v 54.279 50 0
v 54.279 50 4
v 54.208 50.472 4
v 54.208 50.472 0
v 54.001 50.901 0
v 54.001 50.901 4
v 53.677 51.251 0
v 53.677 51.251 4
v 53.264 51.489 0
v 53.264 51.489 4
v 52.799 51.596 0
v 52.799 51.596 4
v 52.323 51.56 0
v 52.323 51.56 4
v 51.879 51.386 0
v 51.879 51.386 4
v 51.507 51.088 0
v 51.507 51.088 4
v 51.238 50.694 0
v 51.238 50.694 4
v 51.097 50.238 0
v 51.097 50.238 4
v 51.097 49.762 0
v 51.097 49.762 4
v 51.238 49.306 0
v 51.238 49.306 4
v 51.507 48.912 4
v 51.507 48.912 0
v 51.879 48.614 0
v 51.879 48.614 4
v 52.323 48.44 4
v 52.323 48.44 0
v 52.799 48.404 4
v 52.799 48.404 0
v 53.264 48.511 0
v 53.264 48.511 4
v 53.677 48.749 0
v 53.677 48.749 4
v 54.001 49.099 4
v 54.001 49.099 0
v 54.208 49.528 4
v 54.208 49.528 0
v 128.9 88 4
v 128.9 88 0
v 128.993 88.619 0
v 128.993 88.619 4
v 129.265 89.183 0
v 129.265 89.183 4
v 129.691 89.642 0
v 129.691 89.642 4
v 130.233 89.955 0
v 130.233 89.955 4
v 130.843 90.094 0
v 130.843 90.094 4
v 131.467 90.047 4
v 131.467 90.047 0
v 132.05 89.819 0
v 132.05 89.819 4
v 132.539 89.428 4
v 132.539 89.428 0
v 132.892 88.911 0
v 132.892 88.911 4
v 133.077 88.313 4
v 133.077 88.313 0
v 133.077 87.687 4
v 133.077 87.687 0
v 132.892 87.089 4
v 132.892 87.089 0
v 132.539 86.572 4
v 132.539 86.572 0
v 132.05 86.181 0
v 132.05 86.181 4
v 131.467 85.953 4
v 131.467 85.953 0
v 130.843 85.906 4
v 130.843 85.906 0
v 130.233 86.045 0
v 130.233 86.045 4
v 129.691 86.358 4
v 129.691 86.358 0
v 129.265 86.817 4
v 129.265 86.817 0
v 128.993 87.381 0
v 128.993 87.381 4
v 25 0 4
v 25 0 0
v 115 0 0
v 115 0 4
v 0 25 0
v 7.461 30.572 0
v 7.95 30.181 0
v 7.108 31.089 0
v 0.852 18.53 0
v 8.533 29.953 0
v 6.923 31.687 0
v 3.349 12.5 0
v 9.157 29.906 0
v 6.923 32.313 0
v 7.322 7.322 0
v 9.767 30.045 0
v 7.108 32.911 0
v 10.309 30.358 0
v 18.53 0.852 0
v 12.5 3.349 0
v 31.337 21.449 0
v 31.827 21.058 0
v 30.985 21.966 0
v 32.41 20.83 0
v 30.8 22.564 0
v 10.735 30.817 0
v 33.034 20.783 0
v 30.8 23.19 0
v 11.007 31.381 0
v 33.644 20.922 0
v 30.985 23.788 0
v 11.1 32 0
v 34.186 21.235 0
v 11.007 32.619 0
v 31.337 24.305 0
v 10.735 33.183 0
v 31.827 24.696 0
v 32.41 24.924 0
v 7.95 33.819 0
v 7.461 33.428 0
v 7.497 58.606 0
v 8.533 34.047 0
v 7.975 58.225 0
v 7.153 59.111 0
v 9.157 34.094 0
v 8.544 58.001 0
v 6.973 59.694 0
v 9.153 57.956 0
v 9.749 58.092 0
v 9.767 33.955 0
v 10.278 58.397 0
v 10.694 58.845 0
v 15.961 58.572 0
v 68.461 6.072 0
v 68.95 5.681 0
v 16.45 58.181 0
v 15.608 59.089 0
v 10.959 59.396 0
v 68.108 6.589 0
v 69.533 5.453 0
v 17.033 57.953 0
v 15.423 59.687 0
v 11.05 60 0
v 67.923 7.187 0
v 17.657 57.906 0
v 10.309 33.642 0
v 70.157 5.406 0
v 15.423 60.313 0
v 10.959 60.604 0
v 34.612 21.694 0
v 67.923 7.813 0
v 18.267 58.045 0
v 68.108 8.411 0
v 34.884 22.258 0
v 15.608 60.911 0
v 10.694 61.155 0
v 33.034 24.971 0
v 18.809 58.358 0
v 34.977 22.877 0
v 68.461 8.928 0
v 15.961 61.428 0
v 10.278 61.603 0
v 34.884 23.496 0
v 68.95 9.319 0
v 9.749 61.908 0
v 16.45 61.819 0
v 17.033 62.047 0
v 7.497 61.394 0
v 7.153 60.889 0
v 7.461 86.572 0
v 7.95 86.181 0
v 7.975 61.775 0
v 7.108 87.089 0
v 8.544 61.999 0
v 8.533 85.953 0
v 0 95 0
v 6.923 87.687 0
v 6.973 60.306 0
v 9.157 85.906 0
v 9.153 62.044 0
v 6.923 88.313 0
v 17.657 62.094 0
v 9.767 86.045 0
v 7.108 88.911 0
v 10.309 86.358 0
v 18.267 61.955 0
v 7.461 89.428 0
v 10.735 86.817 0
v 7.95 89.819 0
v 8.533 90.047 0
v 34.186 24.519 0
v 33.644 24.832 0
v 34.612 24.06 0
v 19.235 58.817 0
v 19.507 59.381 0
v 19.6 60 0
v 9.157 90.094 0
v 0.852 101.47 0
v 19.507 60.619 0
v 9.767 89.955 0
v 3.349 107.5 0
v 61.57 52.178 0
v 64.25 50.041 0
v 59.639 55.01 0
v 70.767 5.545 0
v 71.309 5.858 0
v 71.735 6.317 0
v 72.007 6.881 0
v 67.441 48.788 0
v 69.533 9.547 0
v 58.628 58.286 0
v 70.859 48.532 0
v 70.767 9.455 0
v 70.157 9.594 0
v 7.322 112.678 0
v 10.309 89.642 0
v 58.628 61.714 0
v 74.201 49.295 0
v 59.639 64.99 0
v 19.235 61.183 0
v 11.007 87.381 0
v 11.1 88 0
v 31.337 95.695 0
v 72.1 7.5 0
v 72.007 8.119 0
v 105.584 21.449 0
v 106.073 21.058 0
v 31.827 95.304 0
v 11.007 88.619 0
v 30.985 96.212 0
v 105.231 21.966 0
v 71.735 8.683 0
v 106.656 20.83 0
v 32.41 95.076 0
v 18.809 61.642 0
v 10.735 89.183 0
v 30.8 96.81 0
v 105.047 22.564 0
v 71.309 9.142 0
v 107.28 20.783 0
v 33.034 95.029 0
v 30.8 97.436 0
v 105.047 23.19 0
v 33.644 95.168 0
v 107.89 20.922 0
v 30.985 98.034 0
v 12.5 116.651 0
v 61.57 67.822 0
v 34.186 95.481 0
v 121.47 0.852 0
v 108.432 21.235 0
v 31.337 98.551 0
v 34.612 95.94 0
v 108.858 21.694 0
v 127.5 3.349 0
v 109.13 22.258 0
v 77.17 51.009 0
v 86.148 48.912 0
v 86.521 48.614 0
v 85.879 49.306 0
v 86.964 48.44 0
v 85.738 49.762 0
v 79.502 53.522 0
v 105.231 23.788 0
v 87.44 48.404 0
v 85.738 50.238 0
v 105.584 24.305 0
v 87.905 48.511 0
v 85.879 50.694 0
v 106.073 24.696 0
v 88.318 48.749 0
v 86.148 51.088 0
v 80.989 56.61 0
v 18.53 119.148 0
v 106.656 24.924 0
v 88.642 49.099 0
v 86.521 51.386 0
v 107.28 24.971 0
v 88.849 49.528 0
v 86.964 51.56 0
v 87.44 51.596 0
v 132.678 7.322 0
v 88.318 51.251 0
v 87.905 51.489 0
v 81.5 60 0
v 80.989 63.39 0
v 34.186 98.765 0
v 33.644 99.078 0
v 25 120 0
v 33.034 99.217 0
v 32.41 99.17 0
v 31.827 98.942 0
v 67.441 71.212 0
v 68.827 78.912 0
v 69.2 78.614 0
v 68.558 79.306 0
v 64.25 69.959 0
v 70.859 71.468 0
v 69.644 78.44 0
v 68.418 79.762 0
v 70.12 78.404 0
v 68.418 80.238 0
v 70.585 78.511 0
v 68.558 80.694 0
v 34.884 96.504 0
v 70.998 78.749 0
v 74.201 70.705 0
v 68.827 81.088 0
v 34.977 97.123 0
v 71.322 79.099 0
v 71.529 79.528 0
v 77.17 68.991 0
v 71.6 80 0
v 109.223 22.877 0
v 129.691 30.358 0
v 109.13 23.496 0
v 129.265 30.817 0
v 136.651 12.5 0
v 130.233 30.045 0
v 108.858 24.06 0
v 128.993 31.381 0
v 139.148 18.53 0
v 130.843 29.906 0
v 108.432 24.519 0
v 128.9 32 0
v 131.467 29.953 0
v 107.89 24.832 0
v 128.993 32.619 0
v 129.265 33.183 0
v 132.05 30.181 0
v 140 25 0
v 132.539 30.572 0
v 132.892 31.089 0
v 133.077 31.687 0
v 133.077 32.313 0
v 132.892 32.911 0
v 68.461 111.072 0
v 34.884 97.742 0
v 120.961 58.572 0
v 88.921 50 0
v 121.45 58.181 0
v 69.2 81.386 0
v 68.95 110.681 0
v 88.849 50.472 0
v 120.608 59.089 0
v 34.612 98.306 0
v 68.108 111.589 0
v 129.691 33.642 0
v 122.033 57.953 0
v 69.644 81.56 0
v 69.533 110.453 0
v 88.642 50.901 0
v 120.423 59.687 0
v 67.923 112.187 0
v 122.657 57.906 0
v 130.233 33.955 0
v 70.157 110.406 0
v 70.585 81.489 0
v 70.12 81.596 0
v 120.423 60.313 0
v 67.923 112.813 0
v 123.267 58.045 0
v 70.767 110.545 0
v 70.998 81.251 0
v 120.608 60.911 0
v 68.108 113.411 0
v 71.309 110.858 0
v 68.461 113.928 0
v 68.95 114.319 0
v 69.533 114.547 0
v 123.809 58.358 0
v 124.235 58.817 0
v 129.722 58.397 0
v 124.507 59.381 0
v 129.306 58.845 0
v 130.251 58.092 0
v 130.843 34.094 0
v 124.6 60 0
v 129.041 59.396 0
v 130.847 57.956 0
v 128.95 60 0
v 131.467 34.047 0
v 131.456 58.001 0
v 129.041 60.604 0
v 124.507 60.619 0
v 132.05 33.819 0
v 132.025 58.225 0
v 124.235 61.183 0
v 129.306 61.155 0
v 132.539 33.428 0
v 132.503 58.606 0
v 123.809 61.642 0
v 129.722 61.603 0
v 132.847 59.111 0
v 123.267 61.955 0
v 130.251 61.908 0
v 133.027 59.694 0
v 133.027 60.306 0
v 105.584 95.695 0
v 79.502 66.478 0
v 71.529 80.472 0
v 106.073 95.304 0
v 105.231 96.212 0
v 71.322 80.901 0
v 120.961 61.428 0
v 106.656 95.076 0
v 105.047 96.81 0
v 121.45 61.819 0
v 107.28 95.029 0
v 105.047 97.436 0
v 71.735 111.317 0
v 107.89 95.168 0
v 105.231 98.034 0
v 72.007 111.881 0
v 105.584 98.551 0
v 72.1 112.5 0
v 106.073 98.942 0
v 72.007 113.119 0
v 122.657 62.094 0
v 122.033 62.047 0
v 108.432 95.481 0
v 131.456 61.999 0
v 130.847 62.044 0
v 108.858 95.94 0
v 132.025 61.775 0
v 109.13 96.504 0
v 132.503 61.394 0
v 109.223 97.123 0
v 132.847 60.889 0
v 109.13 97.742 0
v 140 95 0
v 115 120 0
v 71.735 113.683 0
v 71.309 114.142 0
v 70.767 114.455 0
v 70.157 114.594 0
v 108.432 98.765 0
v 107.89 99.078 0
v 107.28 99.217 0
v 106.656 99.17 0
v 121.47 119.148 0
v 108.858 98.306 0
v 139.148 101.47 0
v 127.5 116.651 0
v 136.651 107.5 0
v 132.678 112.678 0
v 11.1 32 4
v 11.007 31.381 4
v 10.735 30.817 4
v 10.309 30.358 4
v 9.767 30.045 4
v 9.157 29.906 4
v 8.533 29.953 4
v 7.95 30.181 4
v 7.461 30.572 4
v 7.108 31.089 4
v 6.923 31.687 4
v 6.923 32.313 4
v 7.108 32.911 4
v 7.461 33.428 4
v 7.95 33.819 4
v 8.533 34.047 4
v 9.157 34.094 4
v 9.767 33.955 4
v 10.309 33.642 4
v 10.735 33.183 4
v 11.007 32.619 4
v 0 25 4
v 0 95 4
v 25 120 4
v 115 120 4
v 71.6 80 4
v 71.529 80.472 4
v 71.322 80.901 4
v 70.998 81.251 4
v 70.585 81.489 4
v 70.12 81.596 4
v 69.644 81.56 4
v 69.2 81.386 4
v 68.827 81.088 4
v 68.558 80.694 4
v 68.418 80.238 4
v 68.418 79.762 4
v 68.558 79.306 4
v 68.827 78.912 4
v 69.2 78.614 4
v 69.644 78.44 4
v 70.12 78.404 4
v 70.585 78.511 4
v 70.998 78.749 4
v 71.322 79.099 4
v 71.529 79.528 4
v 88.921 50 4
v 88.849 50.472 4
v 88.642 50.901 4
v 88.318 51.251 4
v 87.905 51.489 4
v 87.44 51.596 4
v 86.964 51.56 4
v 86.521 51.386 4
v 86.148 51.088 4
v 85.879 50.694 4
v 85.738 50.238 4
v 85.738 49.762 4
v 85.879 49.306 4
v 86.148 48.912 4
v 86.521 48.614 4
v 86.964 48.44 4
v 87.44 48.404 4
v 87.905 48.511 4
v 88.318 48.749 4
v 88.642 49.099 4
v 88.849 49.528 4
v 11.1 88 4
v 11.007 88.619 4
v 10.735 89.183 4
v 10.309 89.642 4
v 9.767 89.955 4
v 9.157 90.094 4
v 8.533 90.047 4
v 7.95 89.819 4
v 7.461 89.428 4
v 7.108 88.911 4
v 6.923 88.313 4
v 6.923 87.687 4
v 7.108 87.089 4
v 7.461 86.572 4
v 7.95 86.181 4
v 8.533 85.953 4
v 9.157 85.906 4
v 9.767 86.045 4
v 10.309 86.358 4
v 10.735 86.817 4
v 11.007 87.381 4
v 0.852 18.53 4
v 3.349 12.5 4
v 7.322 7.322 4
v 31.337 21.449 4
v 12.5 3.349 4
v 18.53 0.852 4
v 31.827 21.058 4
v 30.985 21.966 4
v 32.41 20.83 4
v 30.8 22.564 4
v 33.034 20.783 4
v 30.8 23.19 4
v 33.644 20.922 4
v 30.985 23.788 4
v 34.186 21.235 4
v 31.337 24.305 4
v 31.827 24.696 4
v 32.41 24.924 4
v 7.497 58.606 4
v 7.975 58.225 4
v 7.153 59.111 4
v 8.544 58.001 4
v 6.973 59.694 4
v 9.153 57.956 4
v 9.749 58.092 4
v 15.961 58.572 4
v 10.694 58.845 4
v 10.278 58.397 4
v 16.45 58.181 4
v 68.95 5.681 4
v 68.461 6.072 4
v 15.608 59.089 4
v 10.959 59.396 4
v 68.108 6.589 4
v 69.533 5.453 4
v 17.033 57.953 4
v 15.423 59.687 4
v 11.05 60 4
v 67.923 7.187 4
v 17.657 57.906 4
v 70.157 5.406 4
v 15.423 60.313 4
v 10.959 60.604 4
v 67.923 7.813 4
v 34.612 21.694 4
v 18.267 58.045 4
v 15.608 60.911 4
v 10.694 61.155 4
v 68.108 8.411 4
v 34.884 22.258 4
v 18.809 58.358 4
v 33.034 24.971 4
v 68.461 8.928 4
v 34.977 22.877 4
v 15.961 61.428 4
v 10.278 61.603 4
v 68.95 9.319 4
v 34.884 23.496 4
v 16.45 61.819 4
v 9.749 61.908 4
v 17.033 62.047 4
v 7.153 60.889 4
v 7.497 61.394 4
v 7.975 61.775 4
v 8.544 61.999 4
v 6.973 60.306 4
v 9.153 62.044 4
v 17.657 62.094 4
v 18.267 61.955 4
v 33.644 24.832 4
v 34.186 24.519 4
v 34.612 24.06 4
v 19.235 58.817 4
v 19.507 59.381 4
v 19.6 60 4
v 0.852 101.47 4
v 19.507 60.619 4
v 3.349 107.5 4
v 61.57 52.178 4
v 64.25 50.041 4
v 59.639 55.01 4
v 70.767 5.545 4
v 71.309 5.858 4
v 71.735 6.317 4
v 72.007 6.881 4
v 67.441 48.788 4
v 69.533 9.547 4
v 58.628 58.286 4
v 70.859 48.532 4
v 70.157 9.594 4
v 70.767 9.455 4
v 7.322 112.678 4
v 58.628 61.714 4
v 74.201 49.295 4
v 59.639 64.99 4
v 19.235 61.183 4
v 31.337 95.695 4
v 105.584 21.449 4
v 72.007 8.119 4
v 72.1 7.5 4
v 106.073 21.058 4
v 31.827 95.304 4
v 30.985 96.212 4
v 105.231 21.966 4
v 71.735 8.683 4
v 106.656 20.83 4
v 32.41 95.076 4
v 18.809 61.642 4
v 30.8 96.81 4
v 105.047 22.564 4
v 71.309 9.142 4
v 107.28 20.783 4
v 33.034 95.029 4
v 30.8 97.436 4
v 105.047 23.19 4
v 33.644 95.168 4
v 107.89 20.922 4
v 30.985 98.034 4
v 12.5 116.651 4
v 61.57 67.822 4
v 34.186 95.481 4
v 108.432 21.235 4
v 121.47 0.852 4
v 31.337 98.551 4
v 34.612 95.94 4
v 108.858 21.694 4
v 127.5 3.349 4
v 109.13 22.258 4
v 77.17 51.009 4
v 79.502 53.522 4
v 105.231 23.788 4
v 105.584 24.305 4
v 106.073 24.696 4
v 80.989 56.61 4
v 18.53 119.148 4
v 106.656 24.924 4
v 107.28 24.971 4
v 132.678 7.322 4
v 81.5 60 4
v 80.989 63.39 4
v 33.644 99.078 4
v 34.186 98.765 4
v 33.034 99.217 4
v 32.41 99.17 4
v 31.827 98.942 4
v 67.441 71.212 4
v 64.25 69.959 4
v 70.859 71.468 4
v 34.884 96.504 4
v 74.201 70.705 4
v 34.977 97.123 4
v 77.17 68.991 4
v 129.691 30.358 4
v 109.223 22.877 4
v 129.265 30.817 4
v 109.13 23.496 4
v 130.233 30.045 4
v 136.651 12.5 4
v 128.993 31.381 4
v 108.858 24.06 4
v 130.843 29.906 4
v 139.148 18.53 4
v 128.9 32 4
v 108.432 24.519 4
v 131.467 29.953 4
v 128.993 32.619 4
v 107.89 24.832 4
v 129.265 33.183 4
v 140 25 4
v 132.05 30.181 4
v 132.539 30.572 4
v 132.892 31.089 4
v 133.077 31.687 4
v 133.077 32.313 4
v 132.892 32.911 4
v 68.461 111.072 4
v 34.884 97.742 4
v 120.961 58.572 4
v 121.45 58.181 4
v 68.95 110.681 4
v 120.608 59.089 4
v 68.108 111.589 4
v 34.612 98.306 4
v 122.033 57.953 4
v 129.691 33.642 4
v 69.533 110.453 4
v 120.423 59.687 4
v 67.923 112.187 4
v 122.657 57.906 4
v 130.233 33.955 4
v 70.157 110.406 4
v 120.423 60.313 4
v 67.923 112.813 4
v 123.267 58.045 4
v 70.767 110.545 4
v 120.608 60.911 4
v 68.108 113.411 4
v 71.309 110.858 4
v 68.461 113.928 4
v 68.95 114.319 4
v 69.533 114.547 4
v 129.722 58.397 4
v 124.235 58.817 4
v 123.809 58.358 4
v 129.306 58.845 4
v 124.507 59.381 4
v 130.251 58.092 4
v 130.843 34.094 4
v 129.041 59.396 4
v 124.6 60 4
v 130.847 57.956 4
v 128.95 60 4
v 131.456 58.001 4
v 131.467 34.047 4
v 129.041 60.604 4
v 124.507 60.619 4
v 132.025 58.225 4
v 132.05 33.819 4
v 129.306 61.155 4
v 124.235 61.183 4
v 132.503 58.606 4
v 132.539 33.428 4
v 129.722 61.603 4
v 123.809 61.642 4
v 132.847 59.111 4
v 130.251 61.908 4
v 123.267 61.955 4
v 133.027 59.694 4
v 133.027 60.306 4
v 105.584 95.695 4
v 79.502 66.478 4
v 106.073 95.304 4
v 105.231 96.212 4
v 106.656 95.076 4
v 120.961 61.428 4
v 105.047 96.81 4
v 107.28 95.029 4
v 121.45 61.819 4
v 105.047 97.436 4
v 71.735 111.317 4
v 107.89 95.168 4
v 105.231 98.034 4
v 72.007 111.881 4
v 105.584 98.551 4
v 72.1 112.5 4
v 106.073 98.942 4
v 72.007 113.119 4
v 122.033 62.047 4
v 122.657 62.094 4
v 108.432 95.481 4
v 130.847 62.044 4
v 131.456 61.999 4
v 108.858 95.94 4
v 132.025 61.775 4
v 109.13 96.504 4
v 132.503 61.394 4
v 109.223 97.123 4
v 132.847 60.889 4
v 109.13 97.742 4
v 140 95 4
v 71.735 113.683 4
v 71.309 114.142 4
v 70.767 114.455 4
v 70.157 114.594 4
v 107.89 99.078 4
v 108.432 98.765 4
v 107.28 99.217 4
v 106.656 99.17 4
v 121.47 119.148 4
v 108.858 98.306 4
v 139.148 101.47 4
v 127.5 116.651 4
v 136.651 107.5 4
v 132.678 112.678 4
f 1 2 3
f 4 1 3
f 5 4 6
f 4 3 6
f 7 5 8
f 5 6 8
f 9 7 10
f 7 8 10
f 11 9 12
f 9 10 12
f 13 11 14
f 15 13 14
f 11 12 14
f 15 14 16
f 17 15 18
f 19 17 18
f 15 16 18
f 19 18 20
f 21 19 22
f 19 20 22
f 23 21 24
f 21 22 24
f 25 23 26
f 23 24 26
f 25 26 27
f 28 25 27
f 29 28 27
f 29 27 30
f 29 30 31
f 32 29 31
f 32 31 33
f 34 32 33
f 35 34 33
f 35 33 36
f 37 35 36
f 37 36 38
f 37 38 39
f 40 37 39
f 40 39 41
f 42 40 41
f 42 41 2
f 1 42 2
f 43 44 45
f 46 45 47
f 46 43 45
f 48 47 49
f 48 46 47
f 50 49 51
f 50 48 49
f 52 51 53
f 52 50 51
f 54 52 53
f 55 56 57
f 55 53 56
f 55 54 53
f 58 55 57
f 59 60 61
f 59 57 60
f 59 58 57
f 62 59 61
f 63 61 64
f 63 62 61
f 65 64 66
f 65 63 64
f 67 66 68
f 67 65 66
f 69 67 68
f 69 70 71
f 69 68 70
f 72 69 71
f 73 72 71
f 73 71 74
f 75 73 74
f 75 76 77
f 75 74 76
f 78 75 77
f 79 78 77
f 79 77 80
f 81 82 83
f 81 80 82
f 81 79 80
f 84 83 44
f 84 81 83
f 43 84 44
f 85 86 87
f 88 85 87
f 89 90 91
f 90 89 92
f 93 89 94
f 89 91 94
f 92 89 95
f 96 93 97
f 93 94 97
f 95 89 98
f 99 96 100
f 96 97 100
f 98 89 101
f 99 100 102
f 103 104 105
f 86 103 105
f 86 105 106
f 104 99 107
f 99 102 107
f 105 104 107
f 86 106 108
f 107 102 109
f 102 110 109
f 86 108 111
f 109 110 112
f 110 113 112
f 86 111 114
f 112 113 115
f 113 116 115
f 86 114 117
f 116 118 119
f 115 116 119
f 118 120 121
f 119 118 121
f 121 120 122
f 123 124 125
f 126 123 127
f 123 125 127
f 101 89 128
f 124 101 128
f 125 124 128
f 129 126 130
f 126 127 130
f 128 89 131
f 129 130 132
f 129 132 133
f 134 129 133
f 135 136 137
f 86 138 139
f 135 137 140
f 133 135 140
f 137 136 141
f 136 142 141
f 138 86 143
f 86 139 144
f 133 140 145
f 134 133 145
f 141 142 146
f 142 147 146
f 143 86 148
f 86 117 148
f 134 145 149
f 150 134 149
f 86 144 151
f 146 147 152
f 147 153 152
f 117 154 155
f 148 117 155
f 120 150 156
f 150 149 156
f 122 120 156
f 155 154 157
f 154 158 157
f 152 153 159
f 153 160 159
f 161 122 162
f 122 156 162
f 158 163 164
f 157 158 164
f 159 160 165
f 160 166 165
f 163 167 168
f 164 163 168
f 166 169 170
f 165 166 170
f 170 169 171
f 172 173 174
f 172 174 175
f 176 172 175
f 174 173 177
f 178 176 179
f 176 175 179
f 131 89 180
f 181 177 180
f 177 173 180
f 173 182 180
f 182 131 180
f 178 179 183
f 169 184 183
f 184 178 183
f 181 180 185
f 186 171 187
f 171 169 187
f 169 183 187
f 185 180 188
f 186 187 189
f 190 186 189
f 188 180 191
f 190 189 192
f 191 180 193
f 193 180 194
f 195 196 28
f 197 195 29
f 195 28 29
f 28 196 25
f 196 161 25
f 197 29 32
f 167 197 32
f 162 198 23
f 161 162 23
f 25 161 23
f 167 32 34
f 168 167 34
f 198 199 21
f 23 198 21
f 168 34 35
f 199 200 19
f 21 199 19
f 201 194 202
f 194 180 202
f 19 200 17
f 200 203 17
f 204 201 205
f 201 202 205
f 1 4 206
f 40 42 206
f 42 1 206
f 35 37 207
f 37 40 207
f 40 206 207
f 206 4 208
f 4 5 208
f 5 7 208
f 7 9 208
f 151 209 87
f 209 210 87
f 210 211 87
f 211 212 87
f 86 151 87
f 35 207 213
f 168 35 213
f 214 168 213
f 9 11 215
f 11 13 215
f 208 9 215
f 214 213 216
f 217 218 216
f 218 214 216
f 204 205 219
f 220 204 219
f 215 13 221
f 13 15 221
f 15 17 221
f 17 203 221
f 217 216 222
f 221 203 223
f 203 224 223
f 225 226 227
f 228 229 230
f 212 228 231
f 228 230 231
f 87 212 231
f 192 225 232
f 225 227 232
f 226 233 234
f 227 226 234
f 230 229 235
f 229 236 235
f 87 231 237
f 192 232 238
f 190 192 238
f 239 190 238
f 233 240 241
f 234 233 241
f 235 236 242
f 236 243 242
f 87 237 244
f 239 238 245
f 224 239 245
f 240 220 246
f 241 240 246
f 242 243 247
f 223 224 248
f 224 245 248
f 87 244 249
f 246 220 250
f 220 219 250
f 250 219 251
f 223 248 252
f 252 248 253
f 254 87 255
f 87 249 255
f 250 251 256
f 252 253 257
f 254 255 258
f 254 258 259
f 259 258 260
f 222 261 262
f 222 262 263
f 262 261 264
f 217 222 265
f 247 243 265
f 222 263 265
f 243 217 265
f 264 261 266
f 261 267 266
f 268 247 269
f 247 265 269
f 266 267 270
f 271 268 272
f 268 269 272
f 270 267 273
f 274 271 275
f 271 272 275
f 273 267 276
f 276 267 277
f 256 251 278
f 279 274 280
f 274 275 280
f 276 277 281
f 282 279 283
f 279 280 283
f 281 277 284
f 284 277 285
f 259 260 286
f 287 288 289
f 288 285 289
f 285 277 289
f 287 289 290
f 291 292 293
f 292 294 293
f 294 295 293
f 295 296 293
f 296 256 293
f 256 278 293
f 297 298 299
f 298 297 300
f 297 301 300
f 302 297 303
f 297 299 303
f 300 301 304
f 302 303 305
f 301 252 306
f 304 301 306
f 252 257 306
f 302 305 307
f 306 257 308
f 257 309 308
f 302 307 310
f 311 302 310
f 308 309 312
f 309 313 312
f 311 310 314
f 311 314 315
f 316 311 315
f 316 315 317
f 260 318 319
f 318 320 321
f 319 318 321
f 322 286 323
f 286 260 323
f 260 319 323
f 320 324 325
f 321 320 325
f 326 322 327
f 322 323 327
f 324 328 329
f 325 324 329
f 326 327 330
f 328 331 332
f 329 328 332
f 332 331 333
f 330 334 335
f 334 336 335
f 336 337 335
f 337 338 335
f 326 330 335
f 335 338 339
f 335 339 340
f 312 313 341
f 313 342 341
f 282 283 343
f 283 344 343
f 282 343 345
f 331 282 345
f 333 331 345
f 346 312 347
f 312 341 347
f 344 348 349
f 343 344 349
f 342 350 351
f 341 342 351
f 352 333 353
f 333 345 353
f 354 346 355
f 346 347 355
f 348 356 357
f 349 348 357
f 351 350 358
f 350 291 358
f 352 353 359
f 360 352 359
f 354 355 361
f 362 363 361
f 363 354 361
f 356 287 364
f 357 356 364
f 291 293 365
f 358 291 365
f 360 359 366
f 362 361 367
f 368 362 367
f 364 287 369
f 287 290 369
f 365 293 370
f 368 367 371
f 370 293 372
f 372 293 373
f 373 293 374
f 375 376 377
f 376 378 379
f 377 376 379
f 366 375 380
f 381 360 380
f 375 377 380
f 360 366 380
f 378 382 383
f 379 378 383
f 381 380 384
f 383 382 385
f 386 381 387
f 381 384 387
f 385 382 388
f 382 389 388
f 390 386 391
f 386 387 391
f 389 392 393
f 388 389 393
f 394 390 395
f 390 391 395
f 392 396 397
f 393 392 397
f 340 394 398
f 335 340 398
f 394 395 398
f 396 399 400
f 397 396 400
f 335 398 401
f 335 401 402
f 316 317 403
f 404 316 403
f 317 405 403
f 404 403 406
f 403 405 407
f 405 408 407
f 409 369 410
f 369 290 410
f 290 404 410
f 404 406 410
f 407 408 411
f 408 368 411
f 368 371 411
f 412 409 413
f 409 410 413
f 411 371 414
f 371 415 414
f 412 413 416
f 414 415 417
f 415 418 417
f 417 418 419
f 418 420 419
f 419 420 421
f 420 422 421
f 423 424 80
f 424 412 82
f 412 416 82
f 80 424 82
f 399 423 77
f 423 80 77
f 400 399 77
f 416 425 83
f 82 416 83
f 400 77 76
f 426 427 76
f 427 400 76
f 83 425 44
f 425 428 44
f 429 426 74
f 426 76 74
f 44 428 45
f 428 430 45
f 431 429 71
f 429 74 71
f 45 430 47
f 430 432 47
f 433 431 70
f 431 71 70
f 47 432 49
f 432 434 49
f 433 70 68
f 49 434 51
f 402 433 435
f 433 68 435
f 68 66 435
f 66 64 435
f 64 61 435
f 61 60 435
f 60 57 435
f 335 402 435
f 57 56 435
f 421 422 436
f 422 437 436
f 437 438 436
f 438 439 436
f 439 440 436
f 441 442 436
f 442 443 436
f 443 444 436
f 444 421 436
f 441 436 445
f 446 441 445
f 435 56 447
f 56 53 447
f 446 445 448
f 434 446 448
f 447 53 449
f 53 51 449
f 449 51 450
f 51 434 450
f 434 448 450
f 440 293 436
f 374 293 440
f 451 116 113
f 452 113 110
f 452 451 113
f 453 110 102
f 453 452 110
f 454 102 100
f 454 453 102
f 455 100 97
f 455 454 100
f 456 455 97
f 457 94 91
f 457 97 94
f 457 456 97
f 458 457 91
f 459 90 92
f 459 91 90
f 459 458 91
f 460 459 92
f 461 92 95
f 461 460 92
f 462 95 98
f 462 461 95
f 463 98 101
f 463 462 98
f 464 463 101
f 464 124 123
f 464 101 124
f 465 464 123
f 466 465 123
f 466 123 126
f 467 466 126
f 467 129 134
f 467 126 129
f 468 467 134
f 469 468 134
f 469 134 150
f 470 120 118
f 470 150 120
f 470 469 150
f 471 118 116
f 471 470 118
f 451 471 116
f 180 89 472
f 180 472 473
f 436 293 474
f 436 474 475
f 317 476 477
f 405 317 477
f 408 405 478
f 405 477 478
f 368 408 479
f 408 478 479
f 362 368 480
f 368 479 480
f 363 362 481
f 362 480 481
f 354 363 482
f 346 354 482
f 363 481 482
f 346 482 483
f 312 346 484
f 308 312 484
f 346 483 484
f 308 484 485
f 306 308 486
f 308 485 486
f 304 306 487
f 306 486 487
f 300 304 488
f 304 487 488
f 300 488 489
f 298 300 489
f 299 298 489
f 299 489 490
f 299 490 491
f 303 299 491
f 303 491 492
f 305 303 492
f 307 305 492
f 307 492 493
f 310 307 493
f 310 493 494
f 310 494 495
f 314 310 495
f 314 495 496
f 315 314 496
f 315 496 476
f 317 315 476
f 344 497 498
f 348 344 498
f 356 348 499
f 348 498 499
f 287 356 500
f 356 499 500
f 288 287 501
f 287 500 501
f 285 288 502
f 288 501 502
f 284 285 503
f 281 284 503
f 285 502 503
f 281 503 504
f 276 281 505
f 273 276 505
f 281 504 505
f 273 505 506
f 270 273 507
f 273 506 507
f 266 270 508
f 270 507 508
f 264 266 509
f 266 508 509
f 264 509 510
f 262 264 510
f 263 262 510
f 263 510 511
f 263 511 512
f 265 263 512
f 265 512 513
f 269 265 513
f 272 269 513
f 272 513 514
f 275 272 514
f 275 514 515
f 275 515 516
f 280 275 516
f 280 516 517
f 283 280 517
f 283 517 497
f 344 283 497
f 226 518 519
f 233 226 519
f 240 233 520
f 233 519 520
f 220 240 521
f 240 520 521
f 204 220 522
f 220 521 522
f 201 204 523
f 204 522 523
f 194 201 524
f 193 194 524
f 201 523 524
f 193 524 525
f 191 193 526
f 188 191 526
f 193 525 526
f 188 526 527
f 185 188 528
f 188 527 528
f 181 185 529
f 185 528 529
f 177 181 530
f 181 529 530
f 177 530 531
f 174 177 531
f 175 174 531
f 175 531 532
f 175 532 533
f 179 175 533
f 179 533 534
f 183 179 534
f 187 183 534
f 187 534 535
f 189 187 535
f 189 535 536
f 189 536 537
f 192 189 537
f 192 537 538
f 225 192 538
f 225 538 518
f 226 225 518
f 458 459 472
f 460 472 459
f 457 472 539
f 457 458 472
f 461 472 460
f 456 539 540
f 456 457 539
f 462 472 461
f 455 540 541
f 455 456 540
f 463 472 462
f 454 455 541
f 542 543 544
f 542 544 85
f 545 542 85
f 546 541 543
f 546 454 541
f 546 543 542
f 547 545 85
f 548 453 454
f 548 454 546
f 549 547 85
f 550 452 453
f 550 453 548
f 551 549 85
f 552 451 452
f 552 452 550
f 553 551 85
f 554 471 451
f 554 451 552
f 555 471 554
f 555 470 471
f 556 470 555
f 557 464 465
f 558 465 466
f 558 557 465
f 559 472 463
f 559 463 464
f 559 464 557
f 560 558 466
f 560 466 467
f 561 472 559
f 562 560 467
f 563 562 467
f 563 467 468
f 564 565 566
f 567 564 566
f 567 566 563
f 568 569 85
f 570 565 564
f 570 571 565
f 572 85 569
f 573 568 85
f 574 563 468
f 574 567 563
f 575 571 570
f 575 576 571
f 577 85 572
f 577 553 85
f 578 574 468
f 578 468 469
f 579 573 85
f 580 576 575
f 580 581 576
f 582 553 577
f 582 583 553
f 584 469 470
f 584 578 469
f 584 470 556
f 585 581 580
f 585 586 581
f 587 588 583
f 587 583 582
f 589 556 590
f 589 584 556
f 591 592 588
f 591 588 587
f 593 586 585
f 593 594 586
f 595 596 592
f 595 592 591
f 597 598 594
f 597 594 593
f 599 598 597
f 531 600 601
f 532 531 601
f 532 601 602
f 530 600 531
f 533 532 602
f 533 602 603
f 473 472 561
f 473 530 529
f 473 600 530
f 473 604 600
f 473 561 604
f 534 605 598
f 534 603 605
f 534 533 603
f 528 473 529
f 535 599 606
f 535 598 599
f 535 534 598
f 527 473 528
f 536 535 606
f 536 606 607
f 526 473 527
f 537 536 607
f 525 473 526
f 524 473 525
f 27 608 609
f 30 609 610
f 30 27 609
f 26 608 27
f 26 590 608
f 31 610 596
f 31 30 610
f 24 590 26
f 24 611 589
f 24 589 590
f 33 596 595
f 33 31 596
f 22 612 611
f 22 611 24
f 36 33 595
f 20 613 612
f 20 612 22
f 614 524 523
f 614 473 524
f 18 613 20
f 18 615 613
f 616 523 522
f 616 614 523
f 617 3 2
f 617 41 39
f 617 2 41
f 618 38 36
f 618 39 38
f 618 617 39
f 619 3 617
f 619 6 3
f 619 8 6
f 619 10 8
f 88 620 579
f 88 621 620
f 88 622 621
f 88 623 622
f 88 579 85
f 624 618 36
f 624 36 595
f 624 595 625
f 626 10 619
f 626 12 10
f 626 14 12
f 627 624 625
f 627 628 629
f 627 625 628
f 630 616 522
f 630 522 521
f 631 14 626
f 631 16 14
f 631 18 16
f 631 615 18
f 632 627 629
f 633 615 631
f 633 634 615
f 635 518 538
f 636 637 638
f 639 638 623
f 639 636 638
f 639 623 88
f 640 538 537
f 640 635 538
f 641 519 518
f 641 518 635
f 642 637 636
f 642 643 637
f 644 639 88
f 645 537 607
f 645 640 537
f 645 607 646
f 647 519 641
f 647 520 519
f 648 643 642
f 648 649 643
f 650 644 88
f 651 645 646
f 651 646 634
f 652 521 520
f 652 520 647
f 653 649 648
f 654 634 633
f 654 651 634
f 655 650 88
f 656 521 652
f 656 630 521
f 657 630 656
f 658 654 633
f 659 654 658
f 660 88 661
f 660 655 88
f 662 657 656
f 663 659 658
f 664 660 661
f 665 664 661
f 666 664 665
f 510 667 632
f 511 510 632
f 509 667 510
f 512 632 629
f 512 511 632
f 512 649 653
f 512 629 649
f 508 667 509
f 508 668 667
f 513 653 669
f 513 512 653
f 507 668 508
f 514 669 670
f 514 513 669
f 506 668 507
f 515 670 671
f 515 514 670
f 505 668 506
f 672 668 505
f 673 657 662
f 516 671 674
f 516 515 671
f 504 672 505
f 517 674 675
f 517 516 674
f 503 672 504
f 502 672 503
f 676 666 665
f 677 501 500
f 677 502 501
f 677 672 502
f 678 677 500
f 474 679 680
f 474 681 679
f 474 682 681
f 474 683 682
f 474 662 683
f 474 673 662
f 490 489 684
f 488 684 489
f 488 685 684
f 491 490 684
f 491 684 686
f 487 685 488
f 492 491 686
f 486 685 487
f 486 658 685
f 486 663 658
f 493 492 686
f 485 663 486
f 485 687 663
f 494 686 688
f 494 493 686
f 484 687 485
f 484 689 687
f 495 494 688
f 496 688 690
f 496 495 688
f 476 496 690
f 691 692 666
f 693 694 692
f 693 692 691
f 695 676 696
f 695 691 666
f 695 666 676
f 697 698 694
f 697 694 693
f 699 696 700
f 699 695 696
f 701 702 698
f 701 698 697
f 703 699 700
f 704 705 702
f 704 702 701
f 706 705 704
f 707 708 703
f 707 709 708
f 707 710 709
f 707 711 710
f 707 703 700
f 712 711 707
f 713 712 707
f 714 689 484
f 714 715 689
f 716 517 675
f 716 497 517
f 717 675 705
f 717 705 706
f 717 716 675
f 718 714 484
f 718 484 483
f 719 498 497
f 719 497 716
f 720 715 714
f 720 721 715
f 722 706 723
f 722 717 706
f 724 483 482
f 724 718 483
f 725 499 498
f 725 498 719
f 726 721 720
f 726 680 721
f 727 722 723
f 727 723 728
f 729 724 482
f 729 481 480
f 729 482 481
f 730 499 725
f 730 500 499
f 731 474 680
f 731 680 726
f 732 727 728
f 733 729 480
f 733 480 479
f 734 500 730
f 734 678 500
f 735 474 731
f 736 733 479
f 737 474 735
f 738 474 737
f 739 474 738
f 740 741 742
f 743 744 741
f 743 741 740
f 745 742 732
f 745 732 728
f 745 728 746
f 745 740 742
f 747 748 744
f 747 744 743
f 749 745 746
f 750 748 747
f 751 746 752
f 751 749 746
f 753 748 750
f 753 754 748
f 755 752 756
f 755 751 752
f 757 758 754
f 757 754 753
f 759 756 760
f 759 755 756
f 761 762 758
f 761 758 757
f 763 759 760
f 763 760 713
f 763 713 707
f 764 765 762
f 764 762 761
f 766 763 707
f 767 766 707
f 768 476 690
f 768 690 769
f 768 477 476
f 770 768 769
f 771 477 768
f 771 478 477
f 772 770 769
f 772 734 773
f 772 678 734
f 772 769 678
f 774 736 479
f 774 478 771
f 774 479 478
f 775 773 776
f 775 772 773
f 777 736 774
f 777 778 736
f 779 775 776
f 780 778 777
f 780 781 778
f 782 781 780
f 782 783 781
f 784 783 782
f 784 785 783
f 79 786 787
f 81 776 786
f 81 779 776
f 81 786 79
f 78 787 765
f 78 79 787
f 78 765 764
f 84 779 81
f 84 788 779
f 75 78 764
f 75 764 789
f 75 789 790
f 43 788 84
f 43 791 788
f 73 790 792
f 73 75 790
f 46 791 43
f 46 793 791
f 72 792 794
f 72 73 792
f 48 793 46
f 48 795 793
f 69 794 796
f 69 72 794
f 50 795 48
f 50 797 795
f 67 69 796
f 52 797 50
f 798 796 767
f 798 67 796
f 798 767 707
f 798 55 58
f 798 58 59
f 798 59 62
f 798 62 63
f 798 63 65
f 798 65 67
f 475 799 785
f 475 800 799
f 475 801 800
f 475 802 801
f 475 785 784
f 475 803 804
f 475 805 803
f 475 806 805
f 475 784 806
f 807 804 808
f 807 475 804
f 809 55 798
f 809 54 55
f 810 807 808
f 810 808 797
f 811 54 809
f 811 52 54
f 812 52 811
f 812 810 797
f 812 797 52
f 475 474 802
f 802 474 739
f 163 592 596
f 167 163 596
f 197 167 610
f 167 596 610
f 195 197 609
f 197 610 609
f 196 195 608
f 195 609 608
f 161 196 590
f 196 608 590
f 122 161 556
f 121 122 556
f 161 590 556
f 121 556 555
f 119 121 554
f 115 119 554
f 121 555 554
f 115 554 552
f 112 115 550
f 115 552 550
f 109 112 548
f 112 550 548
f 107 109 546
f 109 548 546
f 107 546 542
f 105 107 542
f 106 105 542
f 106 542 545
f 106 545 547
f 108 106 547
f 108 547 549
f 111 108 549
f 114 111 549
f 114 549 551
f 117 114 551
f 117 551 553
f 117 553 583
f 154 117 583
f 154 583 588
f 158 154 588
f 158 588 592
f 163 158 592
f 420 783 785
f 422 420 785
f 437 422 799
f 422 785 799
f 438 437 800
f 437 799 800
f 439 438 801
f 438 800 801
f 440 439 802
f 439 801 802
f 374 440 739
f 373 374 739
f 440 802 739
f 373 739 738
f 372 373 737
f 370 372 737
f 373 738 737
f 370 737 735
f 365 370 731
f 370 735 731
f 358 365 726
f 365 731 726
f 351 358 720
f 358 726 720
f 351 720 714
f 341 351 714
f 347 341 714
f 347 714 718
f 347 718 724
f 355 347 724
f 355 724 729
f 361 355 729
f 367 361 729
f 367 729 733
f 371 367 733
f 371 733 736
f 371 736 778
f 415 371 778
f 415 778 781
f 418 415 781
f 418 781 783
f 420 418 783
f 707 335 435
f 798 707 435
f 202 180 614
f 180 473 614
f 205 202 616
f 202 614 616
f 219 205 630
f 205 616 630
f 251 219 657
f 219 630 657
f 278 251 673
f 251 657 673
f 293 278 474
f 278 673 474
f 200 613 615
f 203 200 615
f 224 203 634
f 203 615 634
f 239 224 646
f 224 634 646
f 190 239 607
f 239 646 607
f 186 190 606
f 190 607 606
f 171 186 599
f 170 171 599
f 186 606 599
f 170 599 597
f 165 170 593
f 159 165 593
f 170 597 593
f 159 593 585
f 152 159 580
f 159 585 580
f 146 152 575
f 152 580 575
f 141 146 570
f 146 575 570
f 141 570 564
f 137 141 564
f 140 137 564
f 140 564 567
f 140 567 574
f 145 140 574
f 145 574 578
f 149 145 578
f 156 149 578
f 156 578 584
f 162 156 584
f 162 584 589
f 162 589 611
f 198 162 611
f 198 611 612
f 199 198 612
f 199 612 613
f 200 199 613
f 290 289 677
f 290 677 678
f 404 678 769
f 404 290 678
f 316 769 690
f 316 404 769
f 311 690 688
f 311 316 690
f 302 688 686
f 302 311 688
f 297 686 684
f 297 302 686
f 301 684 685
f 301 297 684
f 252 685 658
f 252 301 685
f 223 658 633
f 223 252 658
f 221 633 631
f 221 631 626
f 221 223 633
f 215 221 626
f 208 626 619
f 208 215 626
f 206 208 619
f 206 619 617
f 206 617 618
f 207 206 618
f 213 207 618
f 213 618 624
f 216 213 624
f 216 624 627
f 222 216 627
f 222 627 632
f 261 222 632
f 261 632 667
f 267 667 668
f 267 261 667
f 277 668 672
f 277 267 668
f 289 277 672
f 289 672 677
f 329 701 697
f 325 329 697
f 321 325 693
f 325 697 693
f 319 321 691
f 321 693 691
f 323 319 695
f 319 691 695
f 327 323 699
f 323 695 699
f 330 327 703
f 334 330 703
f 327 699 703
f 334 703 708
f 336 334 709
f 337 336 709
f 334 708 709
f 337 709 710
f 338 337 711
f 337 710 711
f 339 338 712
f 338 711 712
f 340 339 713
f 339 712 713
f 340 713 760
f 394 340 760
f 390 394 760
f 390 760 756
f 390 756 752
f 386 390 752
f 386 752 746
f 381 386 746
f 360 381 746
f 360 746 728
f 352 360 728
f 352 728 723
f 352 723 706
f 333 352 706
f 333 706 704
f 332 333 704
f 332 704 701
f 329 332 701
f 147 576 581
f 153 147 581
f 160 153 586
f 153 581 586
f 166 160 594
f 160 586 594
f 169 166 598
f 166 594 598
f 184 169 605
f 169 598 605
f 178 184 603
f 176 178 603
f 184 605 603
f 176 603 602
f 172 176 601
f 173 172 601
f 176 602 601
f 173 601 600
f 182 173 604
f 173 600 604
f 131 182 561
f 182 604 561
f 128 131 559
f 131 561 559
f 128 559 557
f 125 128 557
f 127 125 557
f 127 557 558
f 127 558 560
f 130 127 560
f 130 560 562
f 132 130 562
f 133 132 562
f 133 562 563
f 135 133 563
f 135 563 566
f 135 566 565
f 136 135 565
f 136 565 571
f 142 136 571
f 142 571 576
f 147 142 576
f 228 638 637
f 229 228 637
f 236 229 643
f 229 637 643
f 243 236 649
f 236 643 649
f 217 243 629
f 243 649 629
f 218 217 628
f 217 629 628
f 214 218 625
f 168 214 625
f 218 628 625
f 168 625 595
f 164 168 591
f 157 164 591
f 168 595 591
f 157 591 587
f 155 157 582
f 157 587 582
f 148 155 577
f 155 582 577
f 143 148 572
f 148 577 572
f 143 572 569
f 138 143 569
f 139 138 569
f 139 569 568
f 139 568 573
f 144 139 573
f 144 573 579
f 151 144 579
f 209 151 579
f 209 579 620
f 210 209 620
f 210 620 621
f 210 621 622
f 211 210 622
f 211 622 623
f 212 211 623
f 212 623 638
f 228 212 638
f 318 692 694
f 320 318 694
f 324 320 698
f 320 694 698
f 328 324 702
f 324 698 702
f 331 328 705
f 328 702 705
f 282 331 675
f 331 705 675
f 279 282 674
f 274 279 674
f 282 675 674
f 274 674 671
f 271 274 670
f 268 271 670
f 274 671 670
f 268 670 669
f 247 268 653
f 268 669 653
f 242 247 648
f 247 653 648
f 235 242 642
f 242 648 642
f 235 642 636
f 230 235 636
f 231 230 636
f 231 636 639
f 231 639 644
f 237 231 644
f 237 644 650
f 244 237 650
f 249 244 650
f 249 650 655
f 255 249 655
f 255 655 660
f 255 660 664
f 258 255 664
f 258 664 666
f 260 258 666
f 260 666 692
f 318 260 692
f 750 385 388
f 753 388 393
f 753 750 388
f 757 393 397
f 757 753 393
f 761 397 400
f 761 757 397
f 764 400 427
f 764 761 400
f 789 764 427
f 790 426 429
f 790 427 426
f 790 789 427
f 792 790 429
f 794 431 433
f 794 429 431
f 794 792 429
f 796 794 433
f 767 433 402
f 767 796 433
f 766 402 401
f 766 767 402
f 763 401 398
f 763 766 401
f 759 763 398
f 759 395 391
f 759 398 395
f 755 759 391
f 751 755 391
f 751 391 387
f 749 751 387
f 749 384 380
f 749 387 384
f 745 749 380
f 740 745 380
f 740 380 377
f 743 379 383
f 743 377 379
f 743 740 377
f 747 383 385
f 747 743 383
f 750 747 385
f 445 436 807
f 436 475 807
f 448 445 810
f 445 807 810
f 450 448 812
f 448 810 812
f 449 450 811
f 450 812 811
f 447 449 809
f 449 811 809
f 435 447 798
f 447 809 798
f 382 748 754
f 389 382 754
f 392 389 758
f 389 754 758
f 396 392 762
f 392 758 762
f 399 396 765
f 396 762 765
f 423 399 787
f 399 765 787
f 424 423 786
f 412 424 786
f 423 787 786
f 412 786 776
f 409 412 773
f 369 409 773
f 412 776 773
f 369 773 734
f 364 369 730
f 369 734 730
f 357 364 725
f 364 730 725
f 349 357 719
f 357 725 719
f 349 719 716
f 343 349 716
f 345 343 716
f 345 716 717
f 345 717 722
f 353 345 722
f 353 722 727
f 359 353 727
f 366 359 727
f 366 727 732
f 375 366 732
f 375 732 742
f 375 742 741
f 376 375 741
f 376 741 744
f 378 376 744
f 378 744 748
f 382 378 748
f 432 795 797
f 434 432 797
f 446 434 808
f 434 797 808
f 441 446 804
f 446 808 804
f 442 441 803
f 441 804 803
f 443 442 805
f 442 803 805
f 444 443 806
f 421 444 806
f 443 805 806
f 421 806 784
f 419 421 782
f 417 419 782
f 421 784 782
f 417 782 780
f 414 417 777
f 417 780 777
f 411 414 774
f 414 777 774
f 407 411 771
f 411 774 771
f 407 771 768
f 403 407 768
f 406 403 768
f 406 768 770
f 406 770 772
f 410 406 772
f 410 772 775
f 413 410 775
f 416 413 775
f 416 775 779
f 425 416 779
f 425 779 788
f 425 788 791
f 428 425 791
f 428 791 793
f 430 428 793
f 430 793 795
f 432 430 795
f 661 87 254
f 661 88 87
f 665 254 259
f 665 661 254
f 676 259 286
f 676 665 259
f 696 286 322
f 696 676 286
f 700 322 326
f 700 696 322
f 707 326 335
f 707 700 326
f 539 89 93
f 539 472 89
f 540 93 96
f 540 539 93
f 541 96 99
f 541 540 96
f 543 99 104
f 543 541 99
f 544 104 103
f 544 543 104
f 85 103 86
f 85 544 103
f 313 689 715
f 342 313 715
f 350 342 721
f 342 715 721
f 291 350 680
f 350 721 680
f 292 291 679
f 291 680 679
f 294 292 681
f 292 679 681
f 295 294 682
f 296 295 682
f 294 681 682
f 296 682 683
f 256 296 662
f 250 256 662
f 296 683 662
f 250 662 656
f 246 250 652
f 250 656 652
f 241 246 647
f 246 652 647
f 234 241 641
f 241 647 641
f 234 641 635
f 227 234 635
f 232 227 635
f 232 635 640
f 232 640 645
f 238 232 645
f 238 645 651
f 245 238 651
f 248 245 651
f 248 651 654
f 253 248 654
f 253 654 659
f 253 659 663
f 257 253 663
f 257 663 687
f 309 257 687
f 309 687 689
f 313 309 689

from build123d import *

# Parameters (mm, degrees)
SKETCH_1_W                 = 140
SKETCH_1_H                 = 120
SKETCH_1_R                 = 11.5
EXTRUDE_1_DEPTH            = 4
SKETCH_31_R                = 2.05
SKETCH_31_R_2              = 2.1
CUT_EXTRUDE_16_DEPTH       = 10
MIRROR_2_COPY_1_SKETCH_R   = 2.05
MIRROR_2_COPY_1_SKETCH_R_2 = 2.1
MIRROR_2_COPY_1_DEPTH      = 10
FILLET_8_R                 = 25
SKETCH_32_R                = 2.1
CUT_EXTRUDE_17_DEPTH       = 10
SKETCH_33_R                = 1.6
CUT_EXTRUDE_18_DEPTH       = 10


with BuildPart() as part:
    # 草图1 → 凸台-拉伸1 (new body)
    with BuildSketch(Plane.XY):
        with Locations((70, 60)):
            Rectangle(SKETCH_1_W, SKETCH_1_H)
        with Locations((70, 60)):
            Circle(SKETCH_1_R, mode=Mode.SUBTRACT)
    extrude(amount=EXTRUDE_1_DEPTH)

    # 草图31 → 切除-拉伸16 (cut)
    with BuildSketch(Plane.XY.offset(4)):
        with Locations((9, 60)):
            Circle(SKETCH_31_R)
        with Locations((9, 88)):
            Circle(SKETCH_31_R_2)
    cut_extrude_16 = extrude(amount=-CUT_EXTRUDE_16_DEPTH, mode=Mode.SUBTRACT)

    # 镜向1: 切除-拉伸16 across plane
    add(cut_extrude_16.mirror(Plane.ZX.offset(60)), mode=Mode.SUBTRACT)

    # 镜向2: 切除-拉伸16 across plane
    add(cut_extrude_16.mirror(Plane.ZY.offset(-70)), mode=Mode.SUBTRACT)

    # 镜向2 copy 1 sketch → 镜向2 copy 1 (cut)
    with BuildSketch(Plane(origin=(140, 120, 4), x_dir=(-1, 0, 0), z_dir=(0, 0, 1))):
        with Locations((9, 60)):
            Circle(MIRROR_2_COPY_1_SKETCH_R)
        with Locations((9, 88)):
            Circle(MIRROR_2_COPY_1_SKETCH_R_2)
    extrude(amount=-MIRROR_2_COPY_1_DEPTH, mode=Mode.SUBTRACT)

    # 圆角8
    fillet_8_edges = [part.edges().sort_by_distance(p)[0] for p in [
        (0, 120, 2),
        (140, 120, 2),
        (140, 0, 2),
        (0, 0, 2),
    ]]
    fillet(fillet_8_edges, radius=FILLET_8_R)

    # 草图32 → 切除-拉伸17 (cut)
    with BuildSketch(Plane.XY.offset(4)):
        with Locations((70, 112.5)):
            Circle(SKETCH_32_R)
        with Locations((107.123106012, 97.123106012)):
            Circle(SKETCH_32_R)
        with Locations((122.5, 60)):
            Circle(SKETCH_32_R)
        with Locations((107.123106012, 22.876893988)):
            Circle(SKETCH_32_R)
        with Locations((70, 7.5)):
            Circle(SKETCH_32_R)
        with Locations((32.876893988, 22.876893988)):
            Circle(SKETCH_32_R)
        with Locations((17.5, 60)):
            Circle(SKETCH_32_R)
        with Locations((32.876893988, 97.123106012)):
            Circle(SKETCH_32_R)
    extrude(amount=-CUT_EXTRUDE_17_DEPTH, mode=Mode.SUBTRACT)

    # 草图33 → 切除-拉伸18 (cut)
    with BuildSketch(Plane.XY.offset(4)):
        with Locations((70, 80)):
            Circle(SKETCH_33_R)
        with Locations((87.320508076, 50)):
            Circle(SKETCH_33_R)
        with Locations((52.679491924, 50)):
            Circle(SKETCH_33_R)
    extrude(amount=-CUT_EXTRUDE_18_DEPTH, mode=Mode.SUBTRACT)


solid = part.part
